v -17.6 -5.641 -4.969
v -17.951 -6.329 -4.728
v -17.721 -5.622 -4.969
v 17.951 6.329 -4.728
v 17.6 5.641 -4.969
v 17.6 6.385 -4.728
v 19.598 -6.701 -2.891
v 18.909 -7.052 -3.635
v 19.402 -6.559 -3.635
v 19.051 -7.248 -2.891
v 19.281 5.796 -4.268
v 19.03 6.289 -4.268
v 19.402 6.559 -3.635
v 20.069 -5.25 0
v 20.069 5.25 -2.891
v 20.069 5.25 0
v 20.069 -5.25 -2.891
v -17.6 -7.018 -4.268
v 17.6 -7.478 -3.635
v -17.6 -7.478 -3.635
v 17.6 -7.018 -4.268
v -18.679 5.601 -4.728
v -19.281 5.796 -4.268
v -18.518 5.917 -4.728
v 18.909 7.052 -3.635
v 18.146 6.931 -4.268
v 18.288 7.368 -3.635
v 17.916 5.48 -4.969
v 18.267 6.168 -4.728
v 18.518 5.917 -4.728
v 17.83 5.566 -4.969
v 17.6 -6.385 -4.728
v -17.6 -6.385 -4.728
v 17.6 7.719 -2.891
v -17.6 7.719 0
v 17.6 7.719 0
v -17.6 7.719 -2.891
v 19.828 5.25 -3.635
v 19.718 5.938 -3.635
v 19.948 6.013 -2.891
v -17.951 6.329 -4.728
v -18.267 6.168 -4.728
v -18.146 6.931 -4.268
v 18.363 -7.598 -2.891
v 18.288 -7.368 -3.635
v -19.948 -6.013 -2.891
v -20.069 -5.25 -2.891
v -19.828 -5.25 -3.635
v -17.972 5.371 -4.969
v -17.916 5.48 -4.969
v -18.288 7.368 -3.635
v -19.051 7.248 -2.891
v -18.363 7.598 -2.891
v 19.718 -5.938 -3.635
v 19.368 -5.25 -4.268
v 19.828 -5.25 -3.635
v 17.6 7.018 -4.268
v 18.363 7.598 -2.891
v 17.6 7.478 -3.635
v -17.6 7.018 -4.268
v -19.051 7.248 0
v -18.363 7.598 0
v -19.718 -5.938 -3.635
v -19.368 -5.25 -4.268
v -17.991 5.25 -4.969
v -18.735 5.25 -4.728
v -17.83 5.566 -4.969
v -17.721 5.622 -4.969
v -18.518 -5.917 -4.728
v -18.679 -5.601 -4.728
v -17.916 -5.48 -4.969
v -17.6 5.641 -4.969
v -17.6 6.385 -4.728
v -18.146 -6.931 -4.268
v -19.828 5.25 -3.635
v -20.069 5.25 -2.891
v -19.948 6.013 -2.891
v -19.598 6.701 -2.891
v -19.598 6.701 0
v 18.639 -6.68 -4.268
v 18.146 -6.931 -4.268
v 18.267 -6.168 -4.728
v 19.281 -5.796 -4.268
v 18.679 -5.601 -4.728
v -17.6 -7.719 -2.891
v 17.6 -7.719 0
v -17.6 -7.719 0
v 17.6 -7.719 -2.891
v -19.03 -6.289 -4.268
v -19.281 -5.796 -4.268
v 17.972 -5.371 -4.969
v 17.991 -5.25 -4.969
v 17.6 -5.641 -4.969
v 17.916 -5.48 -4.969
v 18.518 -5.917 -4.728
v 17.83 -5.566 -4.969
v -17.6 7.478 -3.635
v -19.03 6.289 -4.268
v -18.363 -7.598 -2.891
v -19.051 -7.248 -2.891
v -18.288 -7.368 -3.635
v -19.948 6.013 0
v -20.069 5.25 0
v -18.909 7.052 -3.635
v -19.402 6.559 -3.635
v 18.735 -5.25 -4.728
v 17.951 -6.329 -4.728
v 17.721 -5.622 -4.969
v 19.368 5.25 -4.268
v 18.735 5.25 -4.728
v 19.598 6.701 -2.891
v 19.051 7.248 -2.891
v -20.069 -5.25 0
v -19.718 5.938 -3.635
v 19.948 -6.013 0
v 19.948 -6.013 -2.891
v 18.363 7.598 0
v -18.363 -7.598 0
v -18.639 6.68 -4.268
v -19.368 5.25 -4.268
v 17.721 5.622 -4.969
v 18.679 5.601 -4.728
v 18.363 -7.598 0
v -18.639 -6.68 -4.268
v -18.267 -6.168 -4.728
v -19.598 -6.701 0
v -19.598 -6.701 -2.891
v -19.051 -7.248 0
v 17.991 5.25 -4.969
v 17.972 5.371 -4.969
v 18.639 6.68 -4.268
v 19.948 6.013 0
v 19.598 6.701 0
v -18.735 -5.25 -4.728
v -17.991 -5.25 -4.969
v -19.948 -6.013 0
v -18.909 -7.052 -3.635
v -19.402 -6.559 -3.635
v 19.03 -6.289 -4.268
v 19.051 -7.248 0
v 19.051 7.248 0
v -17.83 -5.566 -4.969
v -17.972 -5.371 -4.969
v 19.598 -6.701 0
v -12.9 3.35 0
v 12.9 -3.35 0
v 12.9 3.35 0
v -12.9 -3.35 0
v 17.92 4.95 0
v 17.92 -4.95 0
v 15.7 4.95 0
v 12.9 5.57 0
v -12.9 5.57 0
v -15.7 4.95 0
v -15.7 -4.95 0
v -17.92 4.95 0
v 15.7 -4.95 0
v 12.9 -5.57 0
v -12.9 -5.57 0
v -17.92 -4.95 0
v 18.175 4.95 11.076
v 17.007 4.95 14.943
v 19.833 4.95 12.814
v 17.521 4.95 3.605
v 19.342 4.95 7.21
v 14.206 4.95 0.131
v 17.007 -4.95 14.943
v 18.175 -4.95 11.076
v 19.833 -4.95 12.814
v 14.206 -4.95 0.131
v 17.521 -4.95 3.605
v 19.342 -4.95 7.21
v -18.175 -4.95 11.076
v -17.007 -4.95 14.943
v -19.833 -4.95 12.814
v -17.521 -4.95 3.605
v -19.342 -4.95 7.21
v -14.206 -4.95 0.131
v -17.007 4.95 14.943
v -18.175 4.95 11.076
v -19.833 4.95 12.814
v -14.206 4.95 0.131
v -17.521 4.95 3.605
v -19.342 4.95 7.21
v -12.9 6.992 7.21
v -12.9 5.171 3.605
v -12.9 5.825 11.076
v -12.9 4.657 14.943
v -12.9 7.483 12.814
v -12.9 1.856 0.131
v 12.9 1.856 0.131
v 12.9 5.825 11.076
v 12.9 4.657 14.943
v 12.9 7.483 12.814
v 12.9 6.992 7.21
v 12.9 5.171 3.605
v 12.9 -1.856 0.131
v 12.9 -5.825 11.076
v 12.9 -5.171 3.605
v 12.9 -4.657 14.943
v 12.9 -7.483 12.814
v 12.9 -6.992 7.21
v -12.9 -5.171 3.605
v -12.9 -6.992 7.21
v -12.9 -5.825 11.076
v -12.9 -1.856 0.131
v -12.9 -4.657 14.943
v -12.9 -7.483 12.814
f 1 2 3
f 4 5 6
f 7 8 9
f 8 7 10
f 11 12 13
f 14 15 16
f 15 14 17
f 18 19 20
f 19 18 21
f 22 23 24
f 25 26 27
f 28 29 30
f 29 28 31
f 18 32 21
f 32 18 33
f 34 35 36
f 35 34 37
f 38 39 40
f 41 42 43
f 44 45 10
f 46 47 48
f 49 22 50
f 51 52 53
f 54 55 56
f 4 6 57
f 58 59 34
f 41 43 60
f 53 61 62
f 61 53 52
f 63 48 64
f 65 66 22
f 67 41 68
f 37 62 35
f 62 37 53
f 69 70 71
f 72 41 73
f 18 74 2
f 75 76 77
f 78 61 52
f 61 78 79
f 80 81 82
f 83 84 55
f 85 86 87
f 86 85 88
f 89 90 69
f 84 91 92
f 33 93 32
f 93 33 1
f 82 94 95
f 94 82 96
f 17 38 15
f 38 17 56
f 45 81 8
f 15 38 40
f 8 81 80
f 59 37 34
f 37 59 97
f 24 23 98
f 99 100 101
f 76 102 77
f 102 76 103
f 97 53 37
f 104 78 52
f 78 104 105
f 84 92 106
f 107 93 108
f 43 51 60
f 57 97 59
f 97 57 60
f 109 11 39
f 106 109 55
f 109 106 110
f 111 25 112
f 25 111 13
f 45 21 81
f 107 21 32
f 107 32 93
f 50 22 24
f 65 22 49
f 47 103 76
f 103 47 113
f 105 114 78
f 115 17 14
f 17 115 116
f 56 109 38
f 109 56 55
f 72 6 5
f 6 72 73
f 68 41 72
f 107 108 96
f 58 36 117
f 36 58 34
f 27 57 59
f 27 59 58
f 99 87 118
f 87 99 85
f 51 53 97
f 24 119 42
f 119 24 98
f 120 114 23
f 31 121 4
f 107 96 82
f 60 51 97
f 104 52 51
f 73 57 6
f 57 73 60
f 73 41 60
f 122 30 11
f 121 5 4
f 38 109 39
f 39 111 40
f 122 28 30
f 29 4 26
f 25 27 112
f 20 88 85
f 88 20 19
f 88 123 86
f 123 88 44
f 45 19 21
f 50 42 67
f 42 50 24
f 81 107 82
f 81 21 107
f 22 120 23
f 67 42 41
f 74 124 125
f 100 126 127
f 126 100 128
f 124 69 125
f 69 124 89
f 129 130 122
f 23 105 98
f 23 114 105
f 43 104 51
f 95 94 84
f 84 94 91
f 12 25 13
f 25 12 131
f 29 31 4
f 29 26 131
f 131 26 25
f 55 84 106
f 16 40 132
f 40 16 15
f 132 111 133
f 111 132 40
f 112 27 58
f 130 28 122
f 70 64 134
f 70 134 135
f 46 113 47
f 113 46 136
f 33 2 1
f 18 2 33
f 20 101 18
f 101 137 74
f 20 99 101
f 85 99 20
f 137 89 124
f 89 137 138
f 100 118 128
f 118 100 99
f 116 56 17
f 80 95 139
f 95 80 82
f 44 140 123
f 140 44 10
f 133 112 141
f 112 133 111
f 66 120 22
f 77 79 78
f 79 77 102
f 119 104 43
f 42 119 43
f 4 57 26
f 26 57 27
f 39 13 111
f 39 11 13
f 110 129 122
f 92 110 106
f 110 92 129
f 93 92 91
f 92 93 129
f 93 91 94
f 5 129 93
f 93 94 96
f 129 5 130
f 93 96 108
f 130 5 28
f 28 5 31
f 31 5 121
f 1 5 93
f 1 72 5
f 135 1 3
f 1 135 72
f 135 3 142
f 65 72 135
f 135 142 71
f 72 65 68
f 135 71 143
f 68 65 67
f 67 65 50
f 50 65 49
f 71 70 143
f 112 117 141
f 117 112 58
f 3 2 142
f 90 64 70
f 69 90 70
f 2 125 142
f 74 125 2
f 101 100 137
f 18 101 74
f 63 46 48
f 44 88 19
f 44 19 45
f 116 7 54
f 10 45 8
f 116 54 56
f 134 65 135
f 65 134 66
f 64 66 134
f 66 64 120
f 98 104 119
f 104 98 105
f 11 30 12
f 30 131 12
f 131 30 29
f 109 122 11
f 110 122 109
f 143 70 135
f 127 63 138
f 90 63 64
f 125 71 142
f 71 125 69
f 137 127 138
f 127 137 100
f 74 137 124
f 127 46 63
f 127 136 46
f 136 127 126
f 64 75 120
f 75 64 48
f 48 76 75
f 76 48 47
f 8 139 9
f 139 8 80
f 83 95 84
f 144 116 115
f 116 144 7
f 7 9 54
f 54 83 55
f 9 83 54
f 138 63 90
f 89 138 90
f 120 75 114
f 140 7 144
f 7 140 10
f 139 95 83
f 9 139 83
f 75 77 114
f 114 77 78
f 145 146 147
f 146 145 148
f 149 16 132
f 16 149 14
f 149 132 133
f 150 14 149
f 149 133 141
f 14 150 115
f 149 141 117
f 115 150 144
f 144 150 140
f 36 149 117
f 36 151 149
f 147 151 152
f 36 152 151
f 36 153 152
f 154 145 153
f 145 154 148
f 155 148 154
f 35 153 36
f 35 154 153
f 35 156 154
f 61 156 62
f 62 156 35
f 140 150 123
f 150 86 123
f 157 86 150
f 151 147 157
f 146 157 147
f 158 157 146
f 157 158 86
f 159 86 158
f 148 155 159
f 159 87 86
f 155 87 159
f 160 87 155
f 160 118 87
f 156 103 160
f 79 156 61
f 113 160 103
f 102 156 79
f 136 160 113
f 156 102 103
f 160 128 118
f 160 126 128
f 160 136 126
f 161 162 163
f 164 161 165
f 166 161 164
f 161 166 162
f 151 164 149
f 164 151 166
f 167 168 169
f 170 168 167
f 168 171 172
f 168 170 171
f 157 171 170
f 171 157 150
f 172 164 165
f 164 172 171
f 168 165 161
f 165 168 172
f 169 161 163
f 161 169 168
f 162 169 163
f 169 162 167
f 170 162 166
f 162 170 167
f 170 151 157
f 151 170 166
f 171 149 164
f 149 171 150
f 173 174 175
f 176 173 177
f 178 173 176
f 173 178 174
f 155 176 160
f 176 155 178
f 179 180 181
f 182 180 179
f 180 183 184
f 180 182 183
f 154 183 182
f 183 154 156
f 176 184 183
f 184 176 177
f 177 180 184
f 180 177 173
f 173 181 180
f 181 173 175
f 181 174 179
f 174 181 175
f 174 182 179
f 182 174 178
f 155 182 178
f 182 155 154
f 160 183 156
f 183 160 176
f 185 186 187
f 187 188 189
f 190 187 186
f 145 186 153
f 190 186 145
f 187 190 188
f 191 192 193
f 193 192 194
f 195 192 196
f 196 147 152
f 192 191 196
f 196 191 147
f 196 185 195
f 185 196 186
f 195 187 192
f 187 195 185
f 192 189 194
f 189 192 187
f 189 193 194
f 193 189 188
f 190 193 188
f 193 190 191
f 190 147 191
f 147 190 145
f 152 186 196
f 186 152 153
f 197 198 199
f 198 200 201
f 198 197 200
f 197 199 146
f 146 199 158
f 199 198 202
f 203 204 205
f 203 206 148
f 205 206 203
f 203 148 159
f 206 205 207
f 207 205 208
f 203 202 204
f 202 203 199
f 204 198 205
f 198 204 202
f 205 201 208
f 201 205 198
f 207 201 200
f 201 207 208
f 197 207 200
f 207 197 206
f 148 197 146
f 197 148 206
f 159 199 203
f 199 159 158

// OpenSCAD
foot_l = 40.2;
foot_w = 15.5;
foot_h = 5;
plug_h = 15;
barb_w = 3;
wall_t = 1.4;

$fn=20;

union() {
     // plug
     short_wall();
     rotate([0, 0, 180])
          short_wall();

     long_wall();
     rotate([0, 0, 180])
          long_wall();

     // foot
     difference(){
          minkowski(){
               cube([foot_l-foot_h, foot_w-foot_h, foot_h], center=true);
               sphere(foot_h/2);
          }
          translate([0, 0, foot_h/2])
               cube([foot_l, foot_w, foot_h], center=true);
     }
}

module short_wall()
{
     translate([(foot_l / 2) - barb_w - wall_t, 0, 0])
          plug_wall(foot_w);
}

module long_wall()
{
     rotate([0, 0, 90])
          translate([(foot_w / 2) - barb_w - wall_t, 0, 0])
          plug_wall(foot_l - 2 * barb_w - 2 * wall_t);
}

module plug_wall(length)
{
     translate([0, (length - 4 * wall_t)/2, 0])
          rotate([90, 5, 0])
          linear_extrude(length - 4 * wall_t)
          polygon([[-barb_w/2,0], [0,plug_h], [barb_w, plug_h-(plug_h/8)], [barb_w/2, plug_h-(plug_h/4)], [barb_w, plug_h-(plug_h/2)], [barb_w/2, plug_h-(3*plug_h/4)], [barb_w-(barb_w/4), 0], [-barb_w/2,0]]);
}
